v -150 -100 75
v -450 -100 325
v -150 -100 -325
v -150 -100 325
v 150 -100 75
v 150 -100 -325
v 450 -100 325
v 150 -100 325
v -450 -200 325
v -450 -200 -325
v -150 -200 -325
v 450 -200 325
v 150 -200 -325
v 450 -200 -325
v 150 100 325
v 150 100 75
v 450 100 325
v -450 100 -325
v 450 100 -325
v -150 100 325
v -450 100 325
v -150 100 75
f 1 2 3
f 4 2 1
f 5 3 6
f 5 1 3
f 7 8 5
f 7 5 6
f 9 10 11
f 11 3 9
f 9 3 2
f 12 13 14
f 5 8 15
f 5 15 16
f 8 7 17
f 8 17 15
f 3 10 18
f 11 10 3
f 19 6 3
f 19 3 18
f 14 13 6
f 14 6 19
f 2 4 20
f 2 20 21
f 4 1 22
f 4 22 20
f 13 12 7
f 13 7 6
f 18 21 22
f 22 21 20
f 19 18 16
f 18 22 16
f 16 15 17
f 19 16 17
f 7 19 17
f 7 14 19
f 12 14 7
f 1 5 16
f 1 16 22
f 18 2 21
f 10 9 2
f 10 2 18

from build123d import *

# Parameters (mm, degrees)
F1_DEPTH = 100
F3_DEPTH = 100


with BuildPart() as f1:
    # F0 (on Front) → F1 (new body, symmetric)
    with BuildSketch(Plane.XZ):
        Polygon((450, -325), (450, 325), (150, 325), (150, 75), (-150, 75), (-150, 325), (-450, 325), (-450, -325), align=None)
    extrude(amount=F1_DEPTH, both=True)

    # F2 (on face) → F3 (join, symmetric)
    with BuildSketch(Plane.XZ.offset(100)):
        Polygon((-450, 325), (-450, -325), (-150, -325), align=None)
        Polygon((450, 325), (150, -325), (450, -325), align=None)
    extrude(amount=F3_DEPTH, both=True)


solid = f1.part
